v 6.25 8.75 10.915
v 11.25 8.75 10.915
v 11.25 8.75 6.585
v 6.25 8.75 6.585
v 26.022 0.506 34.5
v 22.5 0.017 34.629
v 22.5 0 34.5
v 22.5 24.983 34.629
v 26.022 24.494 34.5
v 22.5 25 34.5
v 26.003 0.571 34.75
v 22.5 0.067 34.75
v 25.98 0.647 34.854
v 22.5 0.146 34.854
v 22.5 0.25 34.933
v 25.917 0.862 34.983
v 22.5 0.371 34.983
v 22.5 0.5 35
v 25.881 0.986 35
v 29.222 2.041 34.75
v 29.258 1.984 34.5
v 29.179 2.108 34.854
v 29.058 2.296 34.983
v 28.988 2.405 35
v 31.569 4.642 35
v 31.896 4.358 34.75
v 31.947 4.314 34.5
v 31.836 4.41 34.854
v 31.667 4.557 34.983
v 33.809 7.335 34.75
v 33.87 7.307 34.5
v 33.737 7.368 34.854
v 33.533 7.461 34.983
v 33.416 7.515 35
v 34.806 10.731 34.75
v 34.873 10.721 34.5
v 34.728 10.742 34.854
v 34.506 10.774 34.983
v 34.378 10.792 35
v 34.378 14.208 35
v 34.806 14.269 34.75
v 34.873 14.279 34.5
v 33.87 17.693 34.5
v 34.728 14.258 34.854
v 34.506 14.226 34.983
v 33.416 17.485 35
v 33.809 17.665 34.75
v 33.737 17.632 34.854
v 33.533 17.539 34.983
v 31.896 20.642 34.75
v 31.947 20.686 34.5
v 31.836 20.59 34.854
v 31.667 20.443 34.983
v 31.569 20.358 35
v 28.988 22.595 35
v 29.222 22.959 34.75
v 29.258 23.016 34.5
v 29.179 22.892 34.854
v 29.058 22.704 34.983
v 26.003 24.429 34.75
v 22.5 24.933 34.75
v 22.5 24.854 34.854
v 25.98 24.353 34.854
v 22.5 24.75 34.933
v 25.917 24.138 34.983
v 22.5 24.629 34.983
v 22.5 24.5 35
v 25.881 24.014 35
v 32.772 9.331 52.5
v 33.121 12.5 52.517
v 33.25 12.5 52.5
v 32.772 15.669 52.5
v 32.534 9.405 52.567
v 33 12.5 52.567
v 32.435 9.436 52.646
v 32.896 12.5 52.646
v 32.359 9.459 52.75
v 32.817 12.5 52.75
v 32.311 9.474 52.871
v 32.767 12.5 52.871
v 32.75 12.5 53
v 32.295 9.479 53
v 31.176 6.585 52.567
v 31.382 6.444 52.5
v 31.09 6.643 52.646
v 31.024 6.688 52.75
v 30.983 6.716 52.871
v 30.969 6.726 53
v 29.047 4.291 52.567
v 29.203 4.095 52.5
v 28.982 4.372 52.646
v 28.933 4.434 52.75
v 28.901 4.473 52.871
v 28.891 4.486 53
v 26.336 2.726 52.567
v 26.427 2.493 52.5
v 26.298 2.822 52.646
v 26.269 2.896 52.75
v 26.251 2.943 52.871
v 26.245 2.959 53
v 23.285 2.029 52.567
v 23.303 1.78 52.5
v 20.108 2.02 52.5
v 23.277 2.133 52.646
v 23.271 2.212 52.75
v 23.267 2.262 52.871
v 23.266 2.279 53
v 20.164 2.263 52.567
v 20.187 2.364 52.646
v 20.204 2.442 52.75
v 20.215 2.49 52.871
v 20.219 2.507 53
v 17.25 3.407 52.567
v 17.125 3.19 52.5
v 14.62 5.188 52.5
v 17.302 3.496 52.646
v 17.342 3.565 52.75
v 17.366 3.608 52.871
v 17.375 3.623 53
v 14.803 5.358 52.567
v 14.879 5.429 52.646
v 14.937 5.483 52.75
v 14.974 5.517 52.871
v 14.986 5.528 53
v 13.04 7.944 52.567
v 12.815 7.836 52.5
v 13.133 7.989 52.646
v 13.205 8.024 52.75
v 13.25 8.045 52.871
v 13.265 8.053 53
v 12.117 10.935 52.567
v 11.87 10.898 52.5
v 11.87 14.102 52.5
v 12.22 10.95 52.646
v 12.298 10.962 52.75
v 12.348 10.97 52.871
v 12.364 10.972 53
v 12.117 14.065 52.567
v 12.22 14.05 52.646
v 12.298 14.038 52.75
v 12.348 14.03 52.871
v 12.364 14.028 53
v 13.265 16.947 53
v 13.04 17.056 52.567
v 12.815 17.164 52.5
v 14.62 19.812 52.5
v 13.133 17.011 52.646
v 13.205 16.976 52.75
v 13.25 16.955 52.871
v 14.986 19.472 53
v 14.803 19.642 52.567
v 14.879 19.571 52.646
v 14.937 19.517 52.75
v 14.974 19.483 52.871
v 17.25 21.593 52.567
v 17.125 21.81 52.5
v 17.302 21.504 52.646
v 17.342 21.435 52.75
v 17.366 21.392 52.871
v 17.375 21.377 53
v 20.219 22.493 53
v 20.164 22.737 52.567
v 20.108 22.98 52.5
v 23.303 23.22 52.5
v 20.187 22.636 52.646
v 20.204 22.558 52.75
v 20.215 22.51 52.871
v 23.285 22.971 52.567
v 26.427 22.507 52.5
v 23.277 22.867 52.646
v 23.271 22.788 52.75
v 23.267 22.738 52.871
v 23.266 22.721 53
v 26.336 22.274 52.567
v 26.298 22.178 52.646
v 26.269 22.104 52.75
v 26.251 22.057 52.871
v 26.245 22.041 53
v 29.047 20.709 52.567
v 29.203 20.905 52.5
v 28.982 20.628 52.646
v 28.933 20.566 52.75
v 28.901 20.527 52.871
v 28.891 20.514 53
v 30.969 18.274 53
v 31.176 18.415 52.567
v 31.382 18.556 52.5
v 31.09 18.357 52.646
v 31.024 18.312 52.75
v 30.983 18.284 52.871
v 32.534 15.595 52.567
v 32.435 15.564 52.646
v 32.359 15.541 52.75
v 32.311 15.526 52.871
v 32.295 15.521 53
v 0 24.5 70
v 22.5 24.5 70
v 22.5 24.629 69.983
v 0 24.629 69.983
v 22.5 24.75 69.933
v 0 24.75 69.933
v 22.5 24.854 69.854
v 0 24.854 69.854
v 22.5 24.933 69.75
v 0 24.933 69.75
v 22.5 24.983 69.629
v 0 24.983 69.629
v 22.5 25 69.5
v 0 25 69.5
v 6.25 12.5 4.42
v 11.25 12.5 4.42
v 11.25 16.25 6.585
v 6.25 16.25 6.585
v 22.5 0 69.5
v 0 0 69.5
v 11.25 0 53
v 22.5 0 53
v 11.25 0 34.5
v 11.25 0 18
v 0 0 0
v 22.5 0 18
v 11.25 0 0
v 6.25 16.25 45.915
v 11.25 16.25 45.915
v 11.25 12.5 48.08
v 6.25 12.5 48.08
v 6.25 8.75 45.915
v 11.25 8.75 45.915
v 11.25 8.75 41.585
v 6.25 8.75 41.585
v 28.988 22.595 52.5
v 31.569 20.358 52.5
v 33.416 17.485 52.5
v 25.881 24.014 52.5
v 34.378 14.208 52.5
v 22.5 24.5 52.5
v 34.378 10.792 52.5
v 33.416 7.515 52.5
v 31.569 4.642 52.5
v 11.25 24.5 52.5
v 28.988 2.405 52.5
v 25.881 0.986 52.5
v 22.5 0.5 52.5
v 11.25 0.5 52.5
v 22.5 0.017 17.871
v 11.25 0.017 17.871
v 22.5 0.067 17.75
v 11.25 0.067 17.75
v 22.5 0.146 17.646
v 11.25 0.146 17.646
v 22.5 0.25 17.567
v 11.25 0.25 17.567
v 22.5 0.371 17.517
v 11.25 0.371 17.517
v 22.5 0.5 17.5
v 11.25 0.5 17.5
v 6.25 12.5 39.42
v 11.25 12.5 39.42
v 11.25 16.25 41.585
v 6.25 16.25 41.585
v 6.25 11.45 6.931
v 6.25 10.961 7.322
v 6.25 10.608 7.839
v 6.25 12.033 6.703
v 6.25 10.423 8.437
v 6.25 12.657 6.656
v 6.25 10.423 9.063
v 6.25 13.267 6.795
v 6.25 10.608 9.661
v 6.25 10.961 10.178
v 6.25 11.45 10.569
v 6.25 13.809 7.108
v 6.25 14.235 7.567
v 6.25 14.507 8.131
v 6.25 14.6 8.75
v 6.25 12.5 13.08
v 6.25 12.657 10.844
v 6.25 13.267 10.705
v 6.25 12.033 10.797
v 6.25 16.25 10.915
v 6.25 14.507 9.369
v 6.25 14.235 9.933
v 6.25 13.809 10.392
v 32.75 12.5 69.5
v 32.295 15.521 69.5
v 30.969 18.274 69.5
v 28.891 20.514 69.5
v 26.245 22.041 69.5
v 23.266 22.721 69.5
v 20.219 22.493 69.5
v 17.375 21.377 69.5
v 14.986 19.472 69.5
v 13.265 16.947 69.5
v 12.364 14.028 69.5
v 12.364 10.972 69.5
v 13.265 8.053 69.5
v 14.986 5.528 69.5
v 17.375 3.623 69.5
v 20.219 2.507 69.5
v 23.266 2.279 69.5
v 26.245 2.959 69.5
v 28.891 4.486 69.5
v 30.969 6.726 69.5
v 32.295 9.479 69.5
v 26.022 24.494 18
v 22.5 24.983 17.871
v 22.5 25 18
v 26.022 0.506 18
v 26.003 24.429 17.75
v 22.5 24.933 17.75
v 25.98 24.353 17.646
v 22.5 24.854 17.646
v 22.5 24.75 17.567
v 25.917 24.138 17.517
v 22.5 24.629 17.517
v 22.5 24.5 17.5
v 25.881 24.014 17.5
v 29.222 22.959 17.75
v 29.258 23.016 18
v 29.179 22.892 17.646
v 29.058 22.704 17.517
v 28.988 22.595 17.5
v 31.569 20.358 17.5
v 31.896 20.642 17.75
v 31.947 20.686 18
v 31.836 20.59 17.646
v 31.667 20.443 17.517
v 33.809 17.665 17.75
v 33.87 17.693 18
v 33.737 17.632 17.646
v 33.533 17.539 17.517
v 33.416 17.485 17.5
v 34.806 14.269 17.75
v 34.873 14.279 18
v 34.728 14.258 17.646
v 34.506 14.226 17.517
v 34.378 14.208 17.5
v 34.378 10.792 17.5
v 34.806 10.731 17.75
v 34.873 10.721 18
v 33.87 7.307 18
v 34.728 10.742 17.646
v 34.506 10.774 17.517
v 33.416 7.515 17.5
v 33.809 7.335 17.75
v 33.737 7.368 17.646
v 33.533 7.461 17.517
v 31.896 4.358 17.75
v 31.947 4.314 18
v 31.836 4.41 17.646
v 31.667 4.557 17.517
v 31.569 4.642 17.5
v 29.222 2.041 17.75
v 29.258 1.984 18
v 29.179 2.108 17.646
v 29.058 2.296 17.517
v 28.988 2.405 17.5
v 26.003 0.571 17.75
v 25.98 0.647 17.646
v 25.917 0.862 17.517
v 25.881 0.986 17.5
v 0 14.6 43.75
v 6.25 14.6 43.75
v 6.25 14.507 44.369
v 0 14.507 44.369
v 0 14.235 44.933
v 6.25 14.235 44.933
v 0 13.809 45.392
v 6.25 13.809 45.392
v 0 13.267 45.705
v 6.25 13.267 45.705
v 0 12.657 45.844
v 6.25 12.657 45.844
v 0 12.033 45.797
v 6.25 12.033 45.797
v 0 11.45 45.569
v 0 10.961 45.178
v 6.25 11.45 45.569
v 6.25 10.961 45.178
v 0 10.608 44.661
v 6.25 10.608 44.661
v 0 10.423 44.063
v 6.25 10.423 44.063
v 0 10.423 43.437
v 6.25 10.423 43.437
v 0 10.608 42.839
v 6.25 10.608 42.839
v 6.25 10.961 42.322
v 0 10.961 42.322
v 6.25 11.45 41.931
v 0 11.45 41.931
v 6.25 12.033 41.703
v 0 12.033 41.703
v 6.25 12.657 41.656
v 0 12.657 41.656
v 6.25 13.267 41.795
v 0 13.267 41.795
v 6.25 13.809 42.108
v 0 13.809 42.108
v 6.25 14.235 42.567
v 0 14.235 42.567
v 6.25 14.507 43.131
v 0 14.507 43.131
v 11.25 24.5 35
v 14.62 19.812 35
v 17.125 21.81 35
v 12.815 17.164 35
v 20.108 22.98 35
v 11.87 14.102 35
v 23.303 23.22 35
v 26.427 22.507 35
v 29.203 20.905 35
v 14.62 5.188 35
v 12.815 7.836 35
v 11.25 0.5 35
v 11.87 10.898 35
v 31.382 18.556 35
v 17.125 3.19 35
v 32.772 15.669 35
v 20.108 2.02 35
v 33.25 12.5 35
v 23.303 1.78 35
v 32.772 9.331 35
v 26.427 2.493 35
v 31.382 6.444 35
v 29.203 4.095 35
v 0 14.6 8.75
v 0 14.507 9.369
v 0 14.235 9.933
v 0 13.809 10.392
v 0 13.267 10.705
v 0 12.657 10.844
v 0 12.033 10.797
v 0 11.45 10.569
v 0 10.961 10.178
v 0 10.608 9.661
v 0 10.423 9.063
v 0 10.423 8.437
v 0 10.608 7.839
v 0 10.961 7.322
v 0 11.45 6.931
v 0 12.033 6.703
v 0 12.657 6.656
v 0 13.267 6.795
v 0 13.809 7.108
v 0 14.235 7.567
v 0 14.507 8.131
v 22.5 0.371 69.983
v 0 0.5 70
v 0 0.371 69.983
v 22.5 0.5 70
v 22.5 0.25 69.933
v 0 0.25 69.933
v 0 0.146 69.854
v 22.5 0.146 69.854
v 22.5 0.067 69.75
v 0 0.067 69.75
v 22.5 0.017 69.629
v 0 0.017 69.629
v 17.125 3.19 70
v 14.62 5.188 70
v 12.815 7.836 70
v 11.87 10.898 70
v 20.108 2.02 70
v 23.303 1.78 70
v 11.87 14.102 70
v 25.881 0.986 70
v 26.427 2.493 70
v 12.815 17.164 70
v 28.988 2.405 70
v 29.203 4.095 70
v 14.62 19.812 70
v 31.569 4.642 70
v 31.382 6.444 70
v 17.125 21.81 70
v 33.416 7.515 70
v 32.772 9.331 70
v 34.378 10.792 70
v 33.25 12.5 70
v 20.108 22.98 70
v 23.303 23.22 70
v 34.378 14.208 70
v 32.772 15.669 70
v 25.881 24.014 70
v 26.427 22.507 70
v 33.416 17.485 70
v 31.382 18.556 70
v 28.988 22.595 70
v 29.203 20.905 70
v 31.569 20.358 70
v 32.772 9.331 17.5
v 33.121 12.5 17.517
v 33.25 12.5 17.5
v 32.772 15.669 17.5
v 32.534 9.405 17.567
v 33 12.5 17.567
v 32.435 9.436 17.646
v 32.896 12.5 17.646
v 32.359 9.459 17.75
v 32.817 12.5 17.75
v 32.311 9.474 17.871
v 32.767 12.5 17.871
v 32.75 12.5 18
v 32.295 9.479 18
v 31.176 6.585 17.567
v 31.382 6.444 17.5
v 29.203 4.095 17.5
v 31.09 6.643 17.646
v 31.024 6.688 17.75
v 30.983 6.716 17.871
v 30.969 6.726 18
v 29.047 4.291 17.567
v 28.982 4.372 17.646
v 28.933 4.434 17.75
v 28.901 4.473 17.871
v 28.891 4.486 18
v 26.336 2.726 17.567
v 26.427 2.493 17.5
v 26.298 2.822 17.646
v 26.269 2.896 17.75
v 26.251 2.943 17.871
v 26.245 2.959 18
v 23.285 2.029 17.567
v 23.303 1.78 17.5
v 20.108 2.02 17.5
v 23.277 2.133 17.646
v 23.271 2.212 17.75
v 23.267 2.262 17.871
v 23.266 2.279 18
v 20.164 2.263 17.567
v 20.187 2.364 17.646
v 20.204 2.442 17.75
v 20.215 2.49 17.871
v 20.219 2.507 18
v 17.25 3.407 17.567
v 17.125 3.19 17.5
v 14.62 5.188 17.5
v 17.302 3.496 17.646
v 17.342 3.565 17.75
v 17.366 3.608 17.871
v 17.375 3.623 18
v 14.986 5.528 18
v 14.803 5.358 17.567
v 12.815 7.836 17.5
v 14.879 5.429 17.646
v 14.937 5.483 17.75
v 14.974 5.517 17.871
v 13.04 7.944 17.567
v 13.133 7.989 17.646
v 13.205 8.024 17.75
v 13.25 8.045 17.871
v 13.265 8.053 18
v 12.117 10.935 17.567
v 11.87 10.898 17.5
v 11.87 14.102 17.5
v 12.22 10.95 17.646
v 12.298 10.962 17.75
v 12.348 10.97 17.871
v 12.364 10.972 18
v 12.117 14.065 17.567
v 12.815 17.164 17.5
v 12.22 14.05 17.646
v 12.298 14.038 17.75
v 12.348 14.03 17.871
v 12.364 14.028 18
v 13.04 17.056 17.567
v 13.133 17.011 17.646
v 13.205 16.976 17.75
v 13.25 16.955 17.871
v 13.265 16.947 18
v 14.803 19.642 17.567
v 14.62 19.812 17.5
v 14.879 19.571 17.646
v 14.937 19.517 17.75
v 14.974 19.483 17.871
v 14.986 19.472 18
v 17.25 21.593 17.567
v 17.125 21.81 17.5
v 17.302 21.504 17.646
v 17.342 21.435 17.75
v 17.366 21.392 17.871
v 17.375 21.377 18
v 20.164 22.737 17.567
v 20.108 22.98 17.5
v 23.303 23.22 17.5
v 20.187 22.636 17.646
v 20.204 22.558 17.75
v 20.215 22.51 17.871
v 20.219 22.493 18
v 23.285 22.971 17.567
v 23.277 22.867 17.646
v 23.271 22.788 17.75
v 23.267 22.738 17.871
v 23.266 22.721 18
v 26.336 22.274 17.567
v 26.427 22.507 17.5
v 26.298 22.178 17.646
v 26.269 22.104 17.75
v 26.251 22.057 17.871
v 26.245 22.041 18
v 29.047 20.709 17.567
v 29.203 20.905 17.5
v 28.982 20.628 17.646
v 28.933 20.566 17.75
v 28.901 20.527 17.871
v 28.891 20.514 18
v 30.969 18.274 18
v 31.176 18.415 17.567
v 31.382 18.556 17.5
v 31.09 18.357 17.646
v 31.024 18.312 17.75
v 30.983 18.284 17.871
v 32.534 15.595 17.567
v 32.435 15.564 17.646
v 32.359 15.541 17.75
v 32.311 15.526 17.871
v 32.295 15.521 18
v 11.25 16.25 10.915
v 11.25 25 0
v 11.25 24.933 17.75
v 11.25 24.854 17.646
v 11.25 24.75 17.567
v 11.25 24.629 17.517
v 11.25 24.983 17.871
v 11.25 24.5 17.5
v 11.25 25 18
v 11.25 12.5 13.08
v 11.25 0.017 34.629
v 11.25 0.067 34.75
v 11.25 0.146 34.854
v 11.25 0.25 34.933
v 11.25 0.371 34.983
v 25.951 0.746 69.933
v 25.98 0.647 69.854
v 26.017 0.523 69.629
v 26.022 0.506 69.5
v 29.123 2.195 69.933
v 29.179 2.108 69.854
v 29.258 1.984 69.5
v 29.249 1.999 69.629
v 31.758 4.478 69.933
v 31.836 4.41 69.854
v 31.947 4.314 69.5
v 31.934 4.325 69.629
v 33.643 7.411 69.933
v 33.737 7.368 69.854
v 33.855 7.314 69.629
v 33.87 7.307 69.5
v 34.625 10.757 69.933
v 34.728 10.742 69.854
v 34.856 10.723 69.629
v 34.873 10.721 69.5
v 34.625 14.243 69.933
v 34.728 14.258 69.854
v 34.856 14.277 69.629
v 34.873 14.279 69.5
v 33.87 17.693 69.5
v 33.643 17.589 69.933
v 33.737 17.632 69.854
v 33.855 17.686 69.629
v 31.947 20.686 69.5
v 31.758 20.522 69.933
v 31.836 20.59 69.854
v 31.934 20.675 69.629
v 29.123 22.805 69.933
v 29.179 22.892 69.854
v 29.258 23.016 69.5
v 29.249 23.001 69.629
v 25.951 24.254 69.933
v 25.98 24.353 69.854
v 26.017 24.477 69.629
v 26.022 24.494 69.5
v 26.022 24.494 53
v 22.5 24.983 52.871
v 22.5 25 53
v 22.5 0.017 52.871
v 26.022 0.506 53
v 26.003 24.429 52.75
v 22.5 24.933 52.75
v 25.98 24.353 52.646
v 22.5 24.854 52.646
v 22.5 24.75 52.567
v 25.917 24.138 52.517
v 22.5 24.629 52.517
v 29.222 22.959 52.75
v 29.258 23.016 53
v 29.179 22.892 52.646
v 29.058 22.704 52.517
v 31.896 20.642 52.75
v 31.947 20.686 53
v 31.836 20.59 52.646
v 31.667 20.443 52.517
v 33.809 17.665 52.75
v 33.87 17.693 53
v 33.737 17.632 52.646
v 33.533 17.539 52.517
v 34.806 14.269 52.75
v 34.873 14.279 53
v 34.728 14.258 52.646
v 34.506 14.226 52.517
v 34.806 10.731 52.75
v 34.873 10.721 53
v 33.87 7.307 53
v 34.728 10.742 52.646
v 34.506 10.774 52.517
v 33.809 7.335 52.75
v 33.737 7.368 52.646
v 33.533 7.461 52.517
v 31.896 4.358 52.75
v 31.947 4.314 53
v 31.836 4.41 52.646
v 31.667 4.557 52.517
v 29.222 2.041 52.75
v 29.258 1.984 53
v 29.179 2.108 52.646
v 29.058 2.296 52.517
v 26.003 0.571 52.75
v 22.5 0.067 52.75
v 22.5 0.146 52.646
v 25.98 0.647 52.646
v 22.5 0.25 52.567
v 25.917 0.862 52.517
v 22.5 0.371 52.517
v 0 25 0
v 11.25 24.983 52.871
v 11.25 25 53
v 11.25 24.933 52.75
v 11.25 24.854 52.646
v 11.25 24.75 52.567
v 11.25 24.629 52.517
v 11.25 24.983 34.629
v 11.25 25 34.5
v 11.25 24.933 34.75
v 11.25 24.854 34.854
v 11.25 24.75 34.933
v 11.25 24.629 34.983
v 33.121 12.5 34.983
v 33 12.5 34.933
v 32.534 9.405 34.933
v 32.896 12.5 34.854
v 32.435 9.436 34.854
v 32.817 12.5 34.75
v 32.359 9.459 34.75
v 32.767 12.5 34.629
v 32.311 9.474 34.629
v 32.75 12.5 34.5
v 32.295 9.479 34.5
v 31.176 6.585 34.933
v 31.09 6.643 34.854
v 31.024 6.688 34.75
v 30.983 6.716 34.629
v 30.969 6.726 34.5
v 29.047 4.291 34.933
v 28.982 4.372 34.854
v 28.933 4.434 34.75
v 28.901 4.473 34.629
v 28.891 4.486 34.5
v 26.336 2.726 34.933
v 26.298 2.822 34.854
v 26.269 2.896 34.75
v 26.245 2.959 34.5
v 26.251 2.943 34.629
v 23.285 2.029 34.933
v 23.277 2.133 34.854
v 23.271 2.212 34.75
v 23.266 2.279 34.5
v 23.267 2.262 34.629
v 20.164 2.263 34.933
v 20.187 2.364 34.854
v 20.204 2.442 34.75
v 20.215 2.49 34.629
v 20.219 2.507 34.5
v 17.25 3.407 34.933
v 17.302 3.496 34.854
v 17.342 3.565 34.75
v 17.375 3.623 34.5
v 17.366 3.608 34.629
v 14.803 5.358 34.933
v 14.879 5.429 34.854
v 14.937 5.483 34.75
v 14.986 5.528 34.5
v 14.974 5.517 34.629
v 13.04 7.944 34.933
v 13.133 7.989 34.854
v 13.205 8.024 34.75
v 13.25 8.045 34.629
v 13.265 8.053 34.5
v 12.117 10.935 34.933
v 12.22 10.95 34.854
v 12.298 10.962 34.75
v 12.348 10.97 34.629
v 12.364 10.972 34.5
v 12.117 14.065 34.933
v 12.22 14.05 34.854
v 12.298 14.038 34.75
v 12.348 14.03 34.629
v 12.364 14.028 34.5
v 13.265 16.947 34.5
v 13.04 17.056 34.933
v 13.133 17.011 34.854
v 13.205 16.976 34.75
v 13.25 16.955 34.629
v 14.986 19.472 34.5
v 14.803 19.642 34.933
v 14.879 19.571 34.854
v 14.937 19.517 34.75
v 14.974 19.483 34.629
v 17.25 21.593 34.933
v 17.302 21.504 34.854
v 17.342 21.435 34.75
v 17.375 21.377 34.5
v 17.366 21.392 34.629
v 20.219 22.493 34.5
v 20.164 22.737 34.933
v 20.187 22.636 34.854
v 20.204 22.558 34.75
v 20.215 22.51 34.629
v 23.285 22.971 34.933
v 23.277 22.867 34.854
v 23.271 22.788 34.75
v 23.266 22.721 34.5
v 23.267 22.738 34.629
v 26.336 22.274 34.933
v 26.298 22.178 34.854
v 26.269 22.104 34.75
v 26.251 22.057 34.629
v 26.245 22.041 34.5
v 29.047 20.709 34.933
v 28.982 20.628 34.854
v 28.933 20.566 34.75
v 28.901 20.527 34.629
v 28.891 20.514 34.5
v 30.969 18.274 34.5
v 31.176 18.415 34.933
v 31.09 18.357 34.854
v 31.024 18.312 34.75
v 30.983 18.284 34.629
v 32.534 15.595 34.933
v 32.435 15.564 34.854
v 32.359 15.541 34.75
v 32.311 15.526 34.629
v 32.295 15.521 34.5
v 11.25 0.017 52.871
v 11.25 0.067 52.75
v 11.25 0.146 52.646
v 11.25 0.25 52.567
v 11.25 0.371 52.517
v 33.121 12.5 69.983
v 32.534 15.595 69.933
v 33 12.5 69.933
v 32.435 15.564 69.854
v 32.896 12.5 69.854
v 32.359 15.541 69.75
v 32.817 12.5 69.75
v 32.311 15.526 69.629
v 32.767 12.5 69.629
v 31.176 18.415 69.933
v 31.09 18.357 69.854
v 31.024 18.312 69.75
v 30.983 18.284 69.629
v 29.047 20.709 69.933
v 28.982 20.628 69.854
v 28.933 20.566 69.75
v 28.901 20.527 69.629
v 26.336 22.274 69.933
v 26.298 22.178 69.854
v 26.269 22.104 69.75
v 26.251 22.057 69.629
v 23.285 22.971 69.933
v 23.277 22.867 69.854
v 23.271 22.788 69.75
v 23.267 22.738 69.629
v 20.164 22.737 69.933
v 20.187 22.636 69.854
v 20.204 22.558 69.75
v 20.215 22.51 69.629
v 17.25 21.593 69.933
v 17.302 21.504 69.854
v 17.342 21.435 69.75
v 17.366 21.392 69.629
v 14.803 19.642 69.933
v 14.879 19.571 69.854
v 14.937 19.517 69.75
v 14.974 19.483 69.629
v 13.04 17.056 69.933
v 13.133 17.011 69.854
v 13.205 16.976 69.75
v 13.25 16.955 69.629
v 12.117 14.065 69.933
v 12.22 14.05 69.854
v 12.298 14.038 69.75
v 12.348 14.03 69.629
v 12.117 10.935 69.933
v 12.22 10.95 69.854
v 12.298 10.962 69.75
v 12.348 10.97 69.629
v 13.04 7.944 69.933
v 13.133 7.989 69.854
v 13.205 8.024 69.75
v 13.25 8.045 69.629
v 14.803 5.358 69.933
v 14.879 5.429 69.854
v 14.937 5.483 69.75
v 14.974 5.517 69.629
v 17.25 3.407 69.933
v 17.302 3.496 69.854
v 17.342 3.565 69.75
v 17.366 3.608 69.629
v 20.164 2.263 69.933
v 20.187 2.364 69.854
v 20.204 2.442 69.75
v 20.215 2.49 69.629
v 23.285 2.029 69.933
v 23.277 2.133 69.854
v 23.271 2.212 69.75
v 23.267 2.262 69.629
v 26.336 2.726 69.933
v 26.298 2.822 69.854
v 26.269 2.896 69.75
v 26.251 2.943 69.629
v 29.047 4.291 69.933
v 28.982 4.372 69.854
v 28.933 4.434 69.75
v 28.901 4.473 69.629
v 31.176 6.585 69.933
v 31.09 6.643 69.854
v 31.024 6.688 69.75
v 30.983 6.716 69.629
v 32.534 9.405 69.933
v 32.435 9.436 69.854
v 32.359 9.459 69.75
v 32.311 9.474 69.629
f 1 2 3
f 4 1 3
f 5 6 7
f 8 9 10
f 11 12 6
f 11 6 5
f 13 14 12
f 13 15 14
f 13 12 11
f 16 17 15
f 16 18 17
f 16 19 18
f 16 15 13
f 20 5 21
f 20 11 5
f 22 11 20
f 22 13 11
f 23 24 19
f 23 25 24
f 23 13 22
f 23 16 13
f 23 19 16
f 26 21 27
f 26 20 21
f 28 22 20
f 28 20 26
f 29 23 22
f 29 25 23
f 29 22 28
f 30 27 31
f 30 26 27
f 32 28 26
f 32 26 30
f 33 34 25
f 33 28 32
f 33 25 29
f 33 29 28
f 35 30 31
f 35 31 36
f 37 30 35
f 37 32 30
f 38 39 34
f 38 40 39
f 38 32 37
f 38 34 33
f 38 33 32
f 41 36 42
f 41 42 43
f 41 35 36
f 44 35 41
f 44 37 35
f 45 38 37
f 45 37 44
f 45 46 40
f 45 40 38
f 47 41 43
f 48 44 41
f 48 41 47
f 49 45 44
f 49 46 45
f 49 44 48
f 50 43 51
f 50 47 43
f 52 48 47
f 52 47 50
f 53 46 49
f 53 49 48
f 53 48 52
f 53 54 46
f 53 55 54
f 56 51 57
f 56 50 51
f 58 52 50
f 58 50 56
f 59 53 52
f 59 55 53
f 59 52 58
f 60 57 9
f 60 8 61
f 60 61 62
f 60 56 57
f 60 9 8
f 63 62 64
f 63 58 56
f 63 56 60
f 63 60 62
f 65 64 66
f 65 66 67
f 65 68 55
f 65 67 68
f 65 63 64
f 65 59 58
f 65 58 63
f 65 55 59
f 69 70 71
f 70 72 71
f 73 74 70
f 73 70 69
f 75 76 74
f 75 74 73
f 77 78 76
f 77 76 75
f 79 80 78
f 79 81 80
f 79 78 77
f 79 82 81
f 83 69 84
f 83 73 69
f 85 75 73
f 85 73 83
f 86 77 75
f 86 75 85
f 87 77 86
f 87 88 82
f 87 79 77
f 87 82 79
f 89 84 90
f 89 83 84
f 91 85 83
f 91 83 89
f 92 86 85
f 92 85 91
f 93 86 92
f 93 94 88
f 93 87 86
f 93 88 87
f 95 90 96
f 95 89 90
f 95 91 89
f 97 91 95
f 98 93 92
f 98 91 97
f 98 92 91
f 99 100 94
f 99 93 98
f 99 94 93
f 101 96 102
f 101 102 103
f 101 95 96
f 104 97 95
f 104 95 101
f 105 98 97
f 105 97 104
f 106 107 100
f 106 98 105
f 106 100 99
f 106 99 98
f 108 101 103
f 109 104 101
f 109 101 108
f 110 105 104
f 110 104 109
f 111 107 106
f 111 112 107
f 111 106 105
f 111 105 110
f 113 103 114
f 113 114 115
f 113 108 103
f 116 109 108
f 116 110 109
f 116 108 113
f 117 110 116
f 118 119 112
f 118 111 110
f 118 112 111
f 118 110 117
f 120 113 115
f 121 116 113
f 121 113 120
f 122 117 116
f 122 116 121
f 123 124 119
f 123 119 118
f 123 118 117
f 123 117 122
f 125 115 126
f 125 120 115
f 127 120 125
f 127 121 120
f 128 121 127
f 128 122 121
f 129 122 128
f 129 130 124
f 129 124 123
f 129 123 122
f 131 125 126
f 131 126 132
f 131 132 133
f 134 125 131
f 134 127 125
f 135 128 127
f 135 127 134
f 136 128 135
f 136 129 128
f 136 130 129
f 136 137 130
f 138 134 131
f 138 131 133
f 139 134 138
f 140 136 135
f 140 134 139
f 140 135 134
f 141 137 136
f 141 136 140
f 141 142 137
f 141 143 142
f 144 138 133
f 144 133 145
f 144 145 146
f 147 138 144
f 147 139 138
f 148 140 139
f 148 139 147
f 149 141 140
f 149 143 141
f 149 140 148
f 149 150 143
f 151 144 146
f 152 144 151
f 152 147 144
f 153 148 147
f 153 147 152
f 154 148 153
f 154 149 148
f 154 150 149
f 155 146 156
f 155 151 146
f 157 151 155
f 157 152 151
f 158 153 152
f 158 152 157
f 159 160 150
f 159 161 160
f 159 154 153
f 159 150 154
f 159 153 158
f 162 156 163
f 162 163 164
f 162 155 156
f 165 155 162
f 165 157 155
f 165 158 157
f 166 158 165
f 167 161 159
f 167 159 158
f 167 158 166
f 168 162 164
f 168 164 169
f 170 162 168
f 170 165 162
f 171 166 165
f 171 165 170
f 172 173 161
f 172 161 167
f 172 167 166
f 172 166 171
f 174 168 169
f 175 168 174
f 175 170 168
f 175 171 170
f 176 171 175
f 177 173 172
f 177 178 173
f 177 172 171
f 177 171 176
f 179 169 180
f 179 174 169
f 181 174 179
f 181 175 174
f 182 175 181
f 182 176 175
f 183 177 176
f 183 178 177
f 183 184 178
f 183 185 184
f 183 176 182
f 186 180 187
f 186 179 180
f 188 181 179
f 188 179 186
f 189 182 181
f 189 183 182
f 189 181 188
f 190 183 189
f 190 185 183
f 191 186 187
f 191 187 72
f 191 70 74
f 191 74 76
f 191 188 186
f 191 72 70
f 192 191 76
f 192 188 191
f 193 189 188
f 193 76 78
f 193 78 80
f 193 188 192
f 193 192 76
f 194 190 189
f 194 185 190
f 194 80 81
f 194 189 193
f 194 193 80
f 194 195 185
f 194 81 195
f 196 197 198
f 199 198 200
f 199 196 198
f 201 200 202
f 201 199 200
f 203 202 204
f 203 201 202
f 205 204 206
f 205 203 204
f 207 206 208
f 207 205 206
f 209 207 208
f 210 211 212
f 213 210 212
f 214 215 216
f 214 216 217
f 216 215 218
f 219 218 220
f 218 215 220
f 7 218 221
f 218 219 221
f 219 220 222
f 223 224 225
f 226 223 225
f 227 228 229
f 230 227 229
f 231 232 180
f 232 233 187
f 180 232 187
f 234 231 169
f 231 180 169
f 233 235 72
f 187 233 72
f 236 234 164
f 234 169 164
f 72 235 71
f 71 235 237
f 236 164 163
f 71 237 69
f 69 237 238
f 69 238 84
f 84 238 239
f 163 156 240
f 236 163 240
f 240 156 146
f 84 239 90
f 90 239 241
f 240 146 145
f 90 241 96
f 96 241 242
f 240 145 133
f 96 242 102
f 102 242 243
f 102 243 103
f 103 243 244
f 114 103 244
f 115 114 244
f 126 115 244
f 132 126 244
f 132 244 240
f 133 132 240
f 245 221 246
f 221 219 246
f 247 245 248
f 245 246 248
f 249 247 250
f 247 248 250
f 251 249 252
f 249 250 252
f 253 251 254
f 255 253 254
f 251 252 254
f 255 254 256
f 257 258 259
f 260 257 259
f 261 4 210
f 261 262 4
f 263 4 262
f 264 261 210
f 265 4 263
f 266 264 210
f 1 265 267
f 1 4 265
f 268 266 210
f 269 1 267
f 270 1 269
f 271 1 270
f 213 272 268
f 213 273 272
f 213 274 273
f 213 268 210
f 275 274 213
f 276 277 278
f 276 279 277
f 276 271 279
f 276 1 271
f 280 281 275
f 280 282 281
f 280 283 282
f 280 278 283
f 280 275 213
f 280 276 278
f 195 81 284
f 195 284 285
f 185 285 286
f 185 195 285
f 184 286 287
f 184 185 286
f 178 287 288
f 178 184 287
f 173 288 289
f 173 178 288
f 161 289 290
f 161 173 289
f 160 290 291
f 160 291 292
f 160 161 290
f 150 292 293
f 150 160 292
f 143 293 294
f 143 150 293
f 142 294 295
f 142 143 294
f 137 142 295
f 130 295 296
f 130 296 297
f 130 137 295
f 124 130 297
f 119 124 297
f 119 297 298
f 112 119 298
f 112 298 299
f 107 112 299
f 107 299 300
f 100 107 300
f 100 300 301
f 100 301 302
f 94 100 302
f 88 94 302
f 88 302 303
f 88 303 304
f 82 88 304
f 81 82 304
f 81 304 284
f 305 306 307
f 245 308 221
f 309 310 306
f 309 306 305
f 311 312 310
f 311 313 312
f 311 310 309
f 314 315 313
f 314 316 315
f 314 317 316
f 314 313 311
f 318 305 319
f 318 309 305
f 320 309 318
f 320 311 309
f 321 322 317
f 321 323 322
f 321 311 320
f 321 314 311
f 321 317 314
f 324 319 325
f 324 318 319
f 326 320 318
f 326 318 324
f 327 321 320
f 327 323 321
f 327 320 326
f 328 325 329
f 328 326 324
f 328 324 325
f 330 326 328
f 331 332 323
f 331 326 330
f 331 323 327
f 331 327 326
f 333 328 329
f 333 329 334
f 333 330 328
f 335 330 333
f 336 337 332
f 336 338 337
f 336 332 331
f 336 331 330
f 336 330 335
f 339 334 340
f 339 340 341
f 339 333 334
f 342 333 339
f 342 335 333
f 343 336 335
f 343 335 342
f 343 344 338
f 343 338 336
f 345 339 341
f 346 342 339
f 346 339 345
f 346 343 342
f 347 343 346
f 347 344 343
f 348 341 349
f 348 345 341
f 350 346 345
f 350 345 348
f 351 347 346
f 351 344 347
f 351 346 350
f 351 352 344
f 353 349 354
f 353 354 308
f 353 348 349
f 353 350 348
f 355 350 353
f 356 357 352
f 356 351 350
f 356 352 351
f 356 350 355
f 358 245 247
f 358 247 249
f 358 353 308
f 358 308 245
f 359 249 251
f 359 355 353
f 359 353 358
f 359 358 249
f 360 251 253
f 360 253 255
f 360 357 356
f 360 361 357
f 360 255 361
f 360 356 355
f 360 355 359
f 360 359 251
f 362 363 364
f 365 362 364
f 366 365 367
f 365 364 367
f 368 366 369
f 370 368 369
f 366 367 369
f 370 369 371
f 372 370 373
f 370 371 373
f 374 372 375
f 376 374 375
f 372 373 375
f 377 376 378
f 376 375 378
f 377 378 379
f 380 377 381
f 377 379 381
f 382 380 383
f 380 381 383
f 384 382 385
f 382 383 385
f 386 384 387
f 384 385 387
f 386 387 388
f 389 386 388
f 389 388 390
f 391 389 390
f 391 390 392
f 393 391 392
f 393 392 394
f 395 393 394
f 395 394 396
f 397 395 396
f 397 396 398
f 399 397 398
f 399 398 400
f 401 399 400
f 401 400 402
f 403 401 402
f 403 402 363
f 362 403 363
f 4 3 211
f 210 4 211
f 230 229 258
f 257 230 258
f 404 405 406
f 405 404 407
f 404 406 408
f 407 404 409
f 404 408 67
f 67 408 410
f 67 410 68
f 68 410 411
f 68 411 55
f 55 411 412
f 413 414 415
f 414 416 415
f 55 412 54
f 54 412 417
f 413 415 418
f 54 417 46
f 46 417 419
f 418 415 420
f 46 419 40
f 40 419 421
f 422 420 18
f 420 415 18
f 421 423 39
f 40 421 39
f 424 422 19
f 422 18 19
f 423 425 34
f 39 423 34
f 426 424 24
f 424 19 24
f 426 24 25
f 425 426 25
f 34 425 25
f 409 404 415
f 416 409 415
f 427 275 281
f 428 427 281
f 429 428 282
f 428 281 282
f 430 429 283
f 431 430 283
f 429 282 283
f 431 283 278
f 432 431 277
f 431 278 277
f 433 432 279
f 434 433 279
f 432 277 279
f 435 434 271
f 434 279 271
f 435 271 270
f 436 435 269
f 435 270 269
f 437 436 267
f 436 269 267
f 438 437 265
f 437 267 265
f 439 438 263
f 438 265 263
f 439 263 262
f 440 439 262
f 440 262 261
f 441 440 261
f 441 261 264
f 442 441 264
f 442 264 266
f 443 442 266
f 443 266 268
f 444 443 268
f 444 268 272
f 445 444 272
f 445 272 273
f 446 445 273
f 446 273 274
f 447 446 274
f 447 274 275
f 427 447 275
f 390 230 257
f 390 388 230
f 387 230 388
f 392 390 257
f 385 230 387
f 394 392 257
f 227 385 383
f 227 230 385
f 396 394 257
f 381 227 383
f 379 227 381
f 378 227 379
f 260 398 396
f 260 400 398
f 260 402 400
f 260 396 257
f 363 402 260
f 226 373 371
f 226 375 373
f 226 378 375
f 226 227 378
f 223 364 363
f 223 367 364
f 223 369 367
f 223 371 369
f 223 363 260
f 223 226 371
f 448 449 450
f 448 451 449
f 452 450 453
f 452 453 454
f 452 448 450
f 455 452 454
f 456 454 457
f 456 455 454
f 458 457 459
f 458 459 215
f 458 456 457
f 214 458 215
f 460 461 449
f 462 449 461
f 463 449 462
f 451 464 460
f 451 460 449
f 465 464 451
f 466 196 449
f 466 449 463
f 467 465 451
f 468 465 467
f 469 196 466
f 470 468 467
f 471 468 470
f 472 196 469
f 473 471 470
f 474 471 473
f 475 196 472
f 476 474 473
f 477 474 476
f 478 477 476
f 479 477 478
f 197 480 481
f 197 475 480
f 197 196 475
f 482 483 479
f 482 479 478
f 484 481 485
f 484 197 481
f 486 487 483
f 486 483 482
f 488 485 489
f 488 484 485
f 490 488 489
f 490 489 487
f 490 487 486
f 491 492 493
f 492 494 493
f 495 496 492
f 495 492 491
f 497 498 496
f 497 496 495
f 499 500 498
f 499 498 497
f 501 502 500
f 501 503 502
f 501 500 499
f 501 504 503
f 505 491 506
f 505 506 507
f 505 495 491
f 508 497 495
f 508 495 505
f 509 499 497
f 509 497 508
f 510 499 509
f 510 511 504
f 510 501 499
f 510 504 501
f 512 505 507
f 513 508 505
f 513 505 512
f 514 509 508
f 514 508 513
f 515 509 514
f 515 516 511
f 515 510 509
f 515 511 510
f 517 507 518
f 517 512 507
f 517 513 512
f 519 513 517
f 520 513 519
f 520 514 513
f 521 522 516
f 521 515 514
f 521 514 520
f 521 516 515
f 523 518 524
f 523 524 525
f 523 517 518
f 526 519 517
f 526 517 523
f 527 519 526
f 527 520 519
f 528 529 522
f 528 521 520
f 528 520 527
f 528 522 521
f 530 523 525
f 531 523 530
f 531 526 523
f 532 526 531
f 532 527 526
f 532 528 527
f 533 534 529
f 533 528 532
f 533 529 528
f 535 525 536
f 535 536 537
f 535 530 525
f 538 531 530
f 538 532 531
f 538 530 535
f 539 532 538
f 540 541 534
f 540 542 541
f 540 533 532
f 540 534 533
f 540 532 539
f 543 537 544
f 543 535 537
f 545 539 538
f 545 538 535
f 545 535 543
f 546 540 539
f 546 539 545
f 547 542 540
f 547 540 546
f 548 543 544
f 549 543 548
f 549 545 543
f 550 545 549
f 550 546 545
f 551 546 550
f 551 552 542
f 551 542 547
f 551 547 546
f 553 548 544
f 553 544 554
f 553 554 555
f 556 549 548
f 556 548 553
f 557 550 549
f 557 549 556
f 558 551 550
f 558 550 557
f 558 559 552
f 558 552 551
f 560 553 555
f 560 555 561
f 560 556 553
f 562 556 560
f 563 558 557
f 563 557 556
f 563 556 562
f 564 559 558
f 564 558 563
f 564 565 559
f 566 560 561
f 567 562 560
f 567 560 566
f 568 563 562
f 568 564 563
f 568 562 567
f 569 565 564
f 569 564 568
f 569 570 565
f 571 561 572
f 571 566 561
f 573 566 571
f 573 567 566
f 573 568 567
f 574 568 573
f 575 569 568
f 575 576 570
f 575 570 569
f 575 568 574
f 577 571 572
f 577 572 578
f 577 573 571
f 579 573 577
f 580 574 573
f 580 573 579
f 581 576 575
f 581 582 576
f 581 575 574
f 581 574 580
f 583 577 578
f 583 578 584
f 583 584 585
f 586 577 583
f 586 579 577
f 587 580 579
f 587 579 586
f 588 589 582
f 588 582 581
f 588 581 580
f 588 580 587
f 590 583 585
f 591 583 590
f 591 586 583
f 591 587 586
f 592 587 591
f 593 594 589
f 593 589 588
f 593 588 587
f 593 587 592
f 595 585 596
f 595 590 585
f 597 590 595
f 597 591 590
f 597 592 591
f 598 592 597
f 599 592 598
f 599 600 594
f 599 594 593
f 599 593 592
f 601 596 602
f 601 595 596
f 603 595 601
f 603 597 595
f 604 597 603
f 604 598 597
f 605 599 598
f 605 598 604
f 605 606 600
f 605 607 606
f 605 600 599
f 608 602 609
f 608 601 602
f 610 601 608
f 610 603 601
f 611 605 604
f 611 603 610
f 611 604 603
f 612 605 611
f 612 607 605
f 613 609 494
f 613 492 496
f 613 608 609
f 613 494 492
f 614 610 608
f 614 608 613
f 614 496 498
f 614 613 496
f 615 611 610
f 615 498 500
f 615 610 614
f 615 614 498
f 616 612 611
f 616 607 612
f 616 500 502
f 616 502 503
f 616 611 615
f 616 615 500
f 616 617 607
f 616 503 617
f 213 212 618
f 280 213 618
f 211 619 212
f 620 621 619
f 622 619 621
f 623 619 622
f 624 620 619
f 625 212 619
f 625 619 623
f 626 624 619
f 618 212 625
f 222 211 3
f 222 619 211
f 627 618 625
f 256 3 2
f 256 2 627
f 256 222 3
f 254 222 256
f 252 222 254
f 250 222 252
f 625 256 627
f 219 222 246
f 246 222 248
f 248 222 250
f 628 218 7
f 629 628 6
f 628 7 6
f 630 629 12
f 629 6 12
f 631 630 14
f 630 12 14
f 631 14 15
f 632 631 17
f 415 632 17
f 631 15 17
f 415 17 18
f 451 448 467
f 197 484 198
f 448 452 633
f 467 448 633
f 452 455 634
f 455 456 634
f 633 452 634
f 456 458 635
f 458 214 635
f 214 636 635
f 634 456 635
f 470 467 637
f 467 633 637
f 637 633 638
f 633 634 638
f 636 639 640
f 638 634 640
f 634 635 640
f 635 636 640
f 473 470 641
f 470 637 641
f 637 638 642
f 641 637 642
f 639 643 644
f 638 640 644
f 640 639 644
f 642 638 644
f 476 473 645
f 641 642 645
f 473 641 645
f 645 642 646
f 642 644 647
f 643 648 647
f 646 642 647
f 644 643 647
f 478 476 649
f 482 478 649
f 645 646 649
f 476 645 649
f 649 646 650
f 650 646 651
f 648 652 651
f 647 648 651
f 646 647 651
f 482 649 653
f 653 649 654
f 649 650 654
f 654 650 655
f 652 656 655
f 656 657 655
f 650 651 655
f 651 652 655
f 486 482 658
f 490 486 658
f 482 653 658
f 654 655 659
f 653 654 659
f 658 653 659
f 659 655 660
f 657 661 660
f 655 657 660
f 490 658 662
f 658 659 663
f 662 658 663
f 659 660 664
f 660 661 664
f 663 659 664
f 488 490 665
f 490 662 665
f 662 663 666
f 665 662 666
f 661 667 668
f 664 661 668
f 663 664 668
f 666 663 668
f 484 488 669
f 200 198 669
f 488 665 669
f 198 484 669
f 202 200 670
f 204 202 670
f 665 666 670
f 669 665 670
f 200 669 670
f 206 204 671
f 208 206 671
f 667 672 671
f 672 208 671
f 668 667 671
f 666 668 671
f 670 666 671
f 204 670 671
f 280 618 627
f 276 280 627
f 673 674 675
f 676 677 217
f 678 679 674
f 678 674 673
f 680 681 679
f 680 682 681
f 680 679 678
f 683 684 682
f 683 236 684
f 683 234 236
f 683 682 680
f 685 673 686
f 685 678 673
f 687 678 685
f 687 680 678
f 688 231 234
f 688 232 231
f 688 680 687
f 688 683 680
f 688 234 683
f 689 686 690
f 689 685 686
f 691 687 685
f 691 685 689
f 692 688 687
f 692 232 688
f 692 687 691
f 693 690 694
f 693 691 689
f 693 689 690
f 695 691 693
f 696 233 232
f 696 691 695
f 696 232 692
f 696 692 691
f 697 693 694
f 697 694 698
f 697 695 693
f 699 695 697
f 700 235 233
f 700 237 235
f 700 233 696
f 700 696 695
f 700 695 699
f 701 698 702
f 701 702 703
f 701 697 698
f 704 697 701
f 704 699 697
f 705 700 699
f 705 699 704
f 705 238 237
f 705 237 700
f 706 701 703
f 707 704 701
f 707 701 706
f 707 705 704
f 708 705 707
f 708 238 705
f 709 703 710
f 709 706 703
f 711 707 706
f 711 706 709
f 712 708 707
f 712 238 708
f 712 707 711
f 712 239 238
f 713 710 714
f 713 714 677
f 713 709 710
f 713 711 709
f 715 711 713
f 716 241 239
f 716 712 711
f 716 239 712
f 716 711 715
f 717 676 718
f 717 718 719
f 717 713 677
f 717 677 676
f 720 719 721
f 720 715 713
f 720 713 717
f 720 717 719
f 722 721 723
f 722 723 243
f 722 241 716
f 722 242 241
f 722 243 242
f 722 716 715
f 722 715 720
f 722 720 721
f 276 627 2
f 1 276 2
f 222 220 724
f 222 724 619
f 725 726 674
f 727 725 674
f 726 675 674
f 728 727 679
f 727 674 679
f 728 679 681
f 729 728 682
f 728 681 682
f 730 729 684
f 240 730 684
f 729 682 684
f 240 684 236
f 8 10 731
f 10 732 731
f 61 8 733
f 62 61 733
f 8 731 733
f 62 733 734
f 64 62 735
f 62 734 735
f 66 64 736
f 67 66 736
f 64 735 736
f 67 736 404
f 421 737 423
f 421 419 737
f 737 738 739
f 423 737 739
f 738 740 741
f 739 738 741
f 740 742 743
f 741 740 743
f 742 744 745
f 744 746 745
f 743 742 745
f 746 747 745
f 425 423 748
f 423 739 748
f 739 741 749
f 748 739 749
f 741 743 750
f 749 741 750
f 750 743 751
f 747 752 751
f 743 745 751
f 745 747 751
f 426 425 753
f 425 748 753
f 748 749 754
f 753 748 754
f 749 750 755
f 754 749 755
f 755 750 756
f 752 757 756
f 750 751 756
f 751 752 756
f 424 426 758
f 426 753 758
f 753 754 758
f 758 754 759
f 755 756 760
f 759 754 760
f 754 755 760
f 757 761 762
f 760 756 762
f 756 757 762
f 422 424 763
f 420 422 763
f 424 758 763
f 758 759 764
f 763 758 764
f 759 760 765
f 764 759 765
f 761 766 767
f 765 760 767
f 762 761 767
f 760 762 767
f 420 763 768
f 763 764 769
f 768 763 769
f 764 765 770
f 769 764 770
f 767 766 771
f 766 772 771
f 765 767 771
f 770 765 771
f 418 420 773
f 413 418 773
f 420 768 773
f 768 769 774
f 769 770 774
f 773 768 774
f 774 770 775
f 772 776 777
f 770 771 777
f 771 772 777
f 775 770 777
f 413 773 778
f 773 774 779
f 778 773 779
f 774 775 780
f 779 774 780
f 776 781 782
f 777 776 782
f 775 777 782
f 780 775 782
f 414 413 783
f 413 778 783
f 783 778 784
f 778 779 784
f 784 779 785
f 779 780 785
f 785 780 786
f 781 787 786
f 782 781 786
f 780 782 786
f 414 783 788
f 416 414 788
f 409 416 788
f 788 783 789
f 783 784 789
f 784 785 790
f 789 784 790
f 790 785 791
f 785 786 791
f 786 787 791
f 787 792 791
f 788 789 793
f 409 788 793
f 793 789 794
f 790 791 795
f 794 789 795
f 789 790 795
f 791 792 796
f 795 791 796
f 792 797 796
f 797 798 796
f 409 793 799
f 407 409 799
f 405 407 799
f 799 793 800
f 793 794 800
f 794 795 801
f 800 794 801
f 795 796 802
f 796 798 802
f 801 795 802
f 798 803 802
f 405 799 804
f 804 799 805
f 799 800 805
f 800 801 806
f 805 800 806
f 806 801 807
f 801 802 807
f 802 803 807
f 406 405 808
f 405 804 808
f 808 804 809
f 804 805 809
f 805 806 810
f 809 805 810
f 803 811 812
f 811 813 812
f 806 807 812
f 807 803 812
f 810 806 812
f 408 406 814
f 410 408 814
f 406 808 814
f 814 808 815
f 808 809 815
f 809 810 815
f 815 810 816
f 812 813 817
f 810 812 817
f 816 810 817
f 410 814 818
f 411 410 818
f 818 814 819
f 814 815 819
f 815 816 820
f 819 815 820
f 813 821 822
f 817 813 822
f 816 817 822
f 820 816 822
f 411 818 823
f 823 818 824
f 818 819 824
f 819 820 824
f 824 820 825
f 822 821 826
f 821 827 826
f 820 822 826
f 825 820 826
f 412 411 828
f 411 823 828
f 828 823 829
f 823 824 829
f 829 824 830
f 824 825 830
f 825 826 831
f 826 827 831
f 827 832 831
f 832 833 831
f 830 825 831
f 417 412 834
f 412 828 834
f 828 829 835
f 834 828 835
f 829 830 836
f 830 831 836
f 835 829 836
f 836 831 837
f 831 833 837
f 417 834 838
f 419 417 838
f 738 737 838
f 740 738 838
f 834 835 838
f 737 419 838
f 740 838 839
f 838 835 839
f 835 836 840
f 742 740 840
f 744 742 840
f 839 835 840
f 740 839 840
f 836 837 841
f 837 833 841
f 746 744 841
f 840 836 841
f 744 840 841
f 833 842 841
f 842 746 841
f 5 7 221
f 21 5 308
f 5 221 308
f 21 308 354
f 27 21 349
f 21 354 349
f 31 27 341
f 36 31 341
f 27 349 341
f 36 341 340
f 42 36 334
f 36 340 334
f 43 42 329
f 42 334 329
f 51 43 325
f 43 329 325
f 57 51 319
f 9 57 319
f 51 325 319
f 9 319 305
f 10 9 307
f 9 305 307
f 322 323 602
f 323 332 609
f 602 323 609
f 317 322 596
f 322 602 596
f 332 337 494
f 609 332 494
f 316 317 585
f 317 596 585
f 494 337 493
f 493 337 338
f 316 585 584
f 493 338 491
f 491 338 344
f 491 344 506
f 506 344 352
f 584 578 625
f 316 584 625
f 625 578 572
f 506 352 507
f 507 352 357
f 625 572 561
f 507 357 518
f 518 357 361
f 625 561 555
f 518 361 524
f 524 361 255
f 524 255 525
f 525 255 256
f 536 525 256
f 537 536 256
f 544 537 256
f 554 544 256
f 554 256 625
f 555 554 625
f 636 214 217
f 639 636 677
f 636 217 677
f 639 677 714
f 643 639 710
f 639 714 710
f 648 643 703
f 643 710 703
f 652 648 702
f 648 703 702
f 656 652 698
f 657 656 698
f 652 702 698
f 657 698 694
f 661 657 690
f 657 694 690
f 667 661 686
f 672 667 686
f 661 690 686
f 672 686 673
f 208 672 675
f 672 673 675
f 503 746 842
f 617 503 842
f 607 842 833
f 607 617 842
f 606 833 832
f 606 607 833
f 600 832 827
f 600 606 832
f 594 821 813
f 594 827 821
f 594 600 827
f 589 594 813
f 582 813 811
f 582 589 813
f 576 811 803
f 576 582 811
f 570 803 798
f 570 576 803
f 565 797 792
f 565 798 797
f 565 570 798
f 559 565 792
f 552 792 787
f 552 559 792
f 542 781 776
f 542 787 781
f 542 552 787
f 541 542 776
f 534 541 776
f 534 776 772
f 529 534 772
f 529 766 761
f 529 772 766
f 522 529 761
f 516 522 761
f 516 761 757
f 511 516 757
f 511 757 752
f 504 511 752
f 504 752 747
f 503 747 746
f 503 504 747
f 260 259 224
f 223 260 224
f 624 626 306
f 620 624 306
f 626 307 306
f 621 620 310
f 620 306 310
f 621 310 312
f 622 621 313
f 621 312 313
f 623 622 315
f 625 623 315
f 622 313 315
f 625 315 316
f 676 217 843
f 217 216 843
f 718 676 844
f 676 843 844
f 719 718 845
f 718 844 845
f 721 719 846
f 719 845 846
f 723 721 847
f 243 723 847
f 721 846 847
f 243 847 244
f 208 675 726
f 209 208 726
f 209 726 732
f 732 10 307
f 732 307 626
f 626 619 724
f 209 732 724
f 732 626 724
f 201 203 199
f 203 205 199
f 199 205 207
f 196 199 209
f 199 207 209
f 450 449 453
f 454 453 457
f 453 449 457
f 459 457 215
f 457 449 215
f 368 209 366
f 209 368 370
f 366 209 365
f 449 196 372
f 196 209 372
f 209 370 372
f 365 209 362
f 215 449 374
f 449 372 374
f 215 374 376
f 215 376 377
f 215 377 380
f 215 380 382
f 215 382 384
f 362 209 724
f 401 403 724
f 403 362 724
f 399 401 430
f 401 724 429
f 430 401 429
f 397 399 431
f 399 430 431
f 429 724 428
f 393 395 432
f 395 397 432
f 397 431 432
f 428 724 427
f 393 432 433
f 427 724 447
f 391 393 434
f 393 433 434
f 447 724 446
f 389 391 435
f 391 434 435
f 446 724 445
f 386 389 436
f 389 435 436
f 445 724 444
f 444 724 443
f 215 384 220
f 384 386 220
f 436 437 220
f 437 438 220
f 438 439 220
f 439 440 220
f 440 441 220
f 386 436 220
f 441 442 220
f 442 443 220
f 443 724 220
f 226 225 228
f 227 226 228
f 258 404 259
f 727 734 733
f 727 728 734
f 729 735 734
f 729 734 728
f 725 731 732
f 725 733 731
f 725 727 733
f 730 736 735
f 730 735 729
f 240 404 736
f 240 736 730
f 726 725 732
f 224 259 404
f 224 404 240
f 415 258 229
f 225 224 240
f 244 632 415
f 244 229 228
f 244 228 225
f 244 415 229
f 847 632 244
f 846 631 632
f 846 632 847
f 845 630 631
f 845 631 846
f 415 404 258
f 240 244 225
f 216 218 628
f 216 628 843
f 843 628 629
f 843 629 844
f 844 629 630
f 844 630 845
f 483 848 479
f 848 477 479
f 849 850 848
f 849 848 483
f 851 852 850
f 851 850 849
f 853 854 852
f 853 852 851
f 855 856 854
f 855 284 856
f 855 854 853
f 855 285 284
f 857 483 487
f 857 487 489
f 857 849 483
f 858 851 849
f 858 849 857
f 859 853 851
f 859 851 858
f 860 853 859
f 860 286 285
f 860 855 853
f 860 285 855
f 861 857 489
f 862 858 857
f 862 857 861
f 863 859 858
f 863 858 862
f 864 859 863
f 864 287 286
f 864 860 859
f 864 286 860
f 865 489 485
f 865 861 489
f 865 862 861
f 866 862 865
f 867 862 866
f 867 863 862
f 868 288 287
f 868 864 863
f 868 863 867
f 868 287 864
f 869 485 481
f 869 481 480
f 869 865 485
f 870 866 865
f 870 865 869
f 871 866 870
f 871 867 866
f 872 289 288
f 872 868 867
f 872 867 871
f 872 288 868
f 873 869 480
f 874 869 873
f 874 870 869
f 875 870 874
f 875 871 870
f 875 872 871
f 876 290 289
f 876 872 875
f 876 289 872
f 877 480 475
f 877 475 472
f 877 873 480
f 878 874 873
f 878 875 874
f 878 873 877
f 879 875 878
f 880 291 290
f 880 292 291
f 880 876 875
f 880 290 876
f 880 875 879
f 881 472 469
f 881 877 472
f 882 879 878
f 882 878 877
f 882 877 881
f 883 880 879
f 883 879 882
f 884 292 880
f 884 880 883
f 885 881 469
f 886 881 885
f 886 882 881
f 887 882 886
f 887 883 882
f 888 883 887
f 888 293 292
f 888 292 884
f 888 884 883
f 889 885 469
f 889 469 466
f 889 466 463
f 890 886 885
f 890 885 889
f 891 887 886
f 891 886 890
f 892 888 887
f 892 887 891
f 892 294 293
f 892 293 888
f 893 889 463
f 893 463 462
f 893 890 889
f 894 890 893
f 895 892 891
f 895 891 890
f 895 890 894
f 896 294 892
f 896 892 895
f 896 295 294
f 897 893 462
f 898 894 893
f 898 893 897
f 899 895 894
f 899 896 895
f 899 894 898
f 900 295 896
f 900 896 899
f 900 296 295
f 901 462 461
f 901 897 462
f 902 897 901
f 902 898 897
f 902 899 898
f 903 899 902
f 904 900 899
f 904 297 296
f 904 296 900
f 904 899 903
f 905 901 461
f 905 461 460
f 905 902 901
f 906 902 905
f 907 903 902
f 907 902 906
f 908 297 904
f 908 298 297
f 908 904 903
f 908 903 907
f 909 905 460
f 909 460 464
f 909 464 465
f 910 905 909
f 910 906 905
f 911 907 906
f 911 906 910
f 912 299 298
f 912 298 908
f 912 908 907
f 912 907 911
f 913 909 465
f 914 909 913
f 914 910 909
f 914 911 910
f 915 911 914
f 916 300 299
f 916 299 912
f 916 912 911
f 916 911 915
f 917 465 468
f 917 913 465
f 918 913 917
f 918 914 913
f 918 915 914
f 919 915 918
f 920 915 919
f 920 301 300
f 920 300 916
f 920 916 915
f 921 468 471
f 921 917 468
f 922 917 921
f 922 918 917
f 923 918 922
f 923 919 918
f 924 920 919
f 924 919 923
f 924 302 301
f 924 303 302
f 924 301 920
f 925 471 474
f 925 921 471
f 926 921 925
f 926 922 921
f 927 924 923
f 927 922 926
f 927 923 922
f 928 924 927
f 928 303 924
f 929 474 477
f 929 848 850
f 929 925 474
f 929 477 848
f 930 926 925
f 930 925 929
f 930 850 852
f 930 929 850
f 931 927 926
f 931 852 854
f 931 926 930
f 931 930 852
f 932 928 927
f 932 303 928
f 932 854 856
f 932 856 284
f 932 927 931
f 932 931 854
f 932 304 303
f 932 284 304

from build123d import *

# Parameters (mm, degrees)
F0_R     = 10.25
F1_DEPTH = 70
F2_W     = 11.25
F2_H     = 17.5
F2_W_2   = 18.7990599871
F3_DEPTH = 30
F4_R     = 2.1
F5_DEPTH = 5
F6_DEPTH = 11.251
F7_R     = 2.1
F8_DEPTH = 5
F9_DEPTH = 11.251
F10_R    = 0.5


# Not quite as in the source:
# - a feature names something its author has since deleted; it is built from what else it names


with BuildPart() as f1:
    # F0 (on Top) → F1 (new body)
    with BuildSketch(Plane.XY):
        with BuildLine():
            Line((0, 25), (0, 0))
            Line((0, 0), (22.5, 0))
            ThreePointArc((22.5, 0), (35, 12.5), (22.5, 25))
            Line((22.5, 25), (0, 25))
        make_face()
        with Locations((22.5, 12.5)):
            Circle(F0_R, mode=Mode.SUBTRACT)
    extrude(amount=F1_DEPTH)

    # F2 (on face) → F3 (cut)
    with BuildSketch(Plane.XZ):
        with Locations((16.875, 8.75)):
            Rectangle(F2_W, F2_H)
        with Locations((31.8995299935, 8.75)):
            Rectangle(F2_W_2, F2_H)
        with Locations((16.875, 43.75)):
            Rectangle(F2_W, F2_H)
        with Locations((31.8995299935, 43.75)):
            Rectangle(F2_W_2, F2_H)
    extrude(amount=-F3_DEPTH, mode=Mode.SUBTRACT)

    # F4 (on face) → F5 (cut)
    with BuildSketch(Plane.YZ.offset(11.25)):
        Polygon((16.25, 41.5849364905), (16.25, 45.9150635095), (12.5, 48.0801270189), (8.75, 45.9150635095), (8.75, 41.5849364905), (12.5, 39.4198729811), align=None)
        with Locations((12.5, 43.75)):
            Circle(F4_R, mode=Mode.SUBTRACT)
    extrude(amount=-F5_DEPTH, mode=Mode.SUBTRACT)

    # F6 (cut, through all): a face of the model
    f6_faces = [f1.faces().sort_by_distance(p)[0] for p in [
        (11.25, 12.5, 43.75),
    ]]
    extrude(f6_faces, amount=-F6_DEPTH, mode=Mode.SUBTRACT)

    # F7 (on face) → F8 (cut)
    with BuildSketch(Plane.YZ.offset(11.25)):
        Polygon((16.25, 6.5849364905), (16.25, 10.9150635095), (12.5, 13.0801270189), (8.75, 10.9150635095), (8.75, 6.5849364905), (12.5, 4.4198729811), align=None)
        with Locations((12.5, 8.75)):
            Circle(F7_R, mode=Mode.SUBTRACT)
    extrude(amount=-F8_DEPTH, mode=Mode.SUBTRACT)

    # F9 (cut, through all): a face of the model
    f9_faces = [f1.faces().sort_by_distance(p)[0] for p in [
        (11.25, 12.5, 8.75),
    ]]
    extrude(f9_faces, amount=-F9_DEPTH, mode=Mode.SUBTRACT)

    # F10
    f10_edges = [f1.edges().sort_by_distance(p)[0] for p in [
        (16.875, 0, 52.5),
        (16.875, 0, 35),
        (16.875, 0, 17.5),
        (12.25, 12.5, 17.5),
        (12.25, 12.5, 35),
        (12.25, 12.5, 52.5),
        (12.25, 12.5, 70),
        (35, 12.5, 70),
    ]]
    fillet(f10_edges, radius=F10_R)


solid = f1.part
